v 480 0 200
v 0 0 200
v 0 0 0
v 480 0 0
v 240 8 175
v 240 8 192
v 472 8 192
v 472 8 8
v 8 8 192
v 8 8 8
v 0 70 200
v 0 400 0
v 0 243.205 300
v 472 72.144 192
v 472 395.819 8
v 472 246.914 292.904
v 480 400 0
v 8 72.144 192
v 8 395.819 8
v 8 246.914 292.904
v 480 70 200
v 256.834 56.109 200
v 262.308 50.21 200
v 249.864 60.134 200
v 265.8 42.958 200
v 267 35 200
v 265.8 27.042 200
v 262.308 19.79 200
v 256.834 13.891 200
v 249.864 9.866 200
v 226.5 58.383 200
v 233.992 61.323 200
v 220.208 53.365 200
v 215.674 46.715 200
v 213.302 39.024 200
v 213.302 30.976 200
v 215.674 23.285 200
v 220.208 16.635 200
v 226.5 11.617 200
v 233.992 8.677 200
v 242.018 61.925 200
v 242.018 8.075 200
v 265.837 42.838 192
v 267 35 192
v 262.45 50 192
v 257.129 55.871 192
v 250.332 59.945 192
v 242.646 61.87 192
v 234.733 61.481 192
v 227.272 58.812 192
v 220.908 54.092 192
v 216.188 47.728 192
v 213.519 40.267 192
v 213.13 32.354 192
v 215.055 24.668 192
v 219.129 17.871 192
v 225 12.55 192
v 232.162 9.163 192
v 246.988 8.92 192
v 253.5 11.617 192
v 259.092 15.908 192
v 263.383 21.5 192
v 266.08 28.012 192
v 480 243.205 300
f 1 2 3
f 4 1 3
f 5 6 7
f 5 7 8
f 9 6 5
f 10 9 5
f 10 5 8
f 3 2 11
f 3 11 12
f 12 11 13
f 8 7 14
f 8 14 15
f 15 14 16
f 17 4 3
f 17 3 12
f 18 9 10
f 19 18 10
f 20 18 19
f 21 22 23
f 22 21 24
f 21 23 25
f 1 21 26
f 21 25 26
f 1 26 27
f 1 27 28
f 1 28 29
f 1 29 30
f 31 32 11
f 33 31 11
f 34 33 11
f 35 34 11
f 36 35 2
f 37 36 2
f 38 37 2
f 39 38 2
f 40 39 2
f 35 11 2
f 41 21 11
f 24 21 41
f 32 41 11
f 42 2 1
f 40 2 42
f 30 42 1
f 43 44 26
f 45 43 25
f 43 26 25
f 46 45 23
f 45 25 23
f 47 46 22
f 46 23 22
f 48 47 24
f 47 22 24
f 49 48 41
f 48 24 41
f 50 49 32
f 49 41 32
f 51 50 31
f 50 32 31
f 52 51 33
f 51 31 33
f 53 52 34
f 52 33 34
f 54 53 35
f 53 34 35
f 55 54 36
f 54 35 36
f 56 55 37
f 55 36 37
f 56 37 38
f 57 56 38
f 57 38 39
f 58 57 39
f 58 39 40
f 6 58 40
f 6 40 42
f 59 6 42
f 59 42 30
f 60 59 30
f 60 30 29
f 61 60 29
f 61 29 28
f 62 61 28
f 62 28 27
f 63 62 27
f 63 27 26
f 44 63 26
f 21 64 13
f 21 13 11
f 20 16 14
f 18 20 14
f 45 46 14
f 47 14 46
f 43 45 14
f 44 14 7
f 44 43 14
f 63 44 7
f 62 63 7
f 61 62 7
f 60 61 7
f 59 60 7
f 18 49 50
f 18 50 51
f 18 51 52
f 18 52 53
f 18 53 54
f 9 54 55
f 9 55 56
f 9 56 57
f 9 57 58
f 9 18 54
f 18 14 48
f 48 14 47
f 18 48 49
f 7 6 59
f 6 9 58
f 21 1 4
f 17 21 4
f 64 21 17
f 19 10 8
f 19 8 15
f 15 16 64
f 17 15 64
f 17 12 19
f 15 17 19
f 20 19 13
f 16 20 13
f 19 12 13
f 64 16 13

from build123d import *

# Parameters (mm, degrees)
F1_DEPTH = 480
F2_T     = -8
F3_R     = 27
F4_DEPTH = 25


with BuildPart() as f1:
    # F0 (on Right) → F1 (new body)
    with BuildSketch(Plane.YZ):
        Polygon((0, 200), (0, 0), (400, 0), (243.2050807569, 300), (70, 200), align=None)
    extrude(amount=F1_DEPTH)

    # F2
    f2_openings = [f1.faces().sort_by_distance(p)[0] for p in [
        (240, 321.60254, 150),
    ]]
    offset(amount=F2_T, openings=f2_openings, kind=Kind.INTERSECTION)

    # F3 (on face) → F4 (cut)
    with BuildSketch(Plane.XY.offset(200)):
        with Locations((240, 35)):
            Circle(F3_R)
    extrude(amount=-F4_DEPTH, mode=Mode.SUBTRACT)


solid = f1.part
